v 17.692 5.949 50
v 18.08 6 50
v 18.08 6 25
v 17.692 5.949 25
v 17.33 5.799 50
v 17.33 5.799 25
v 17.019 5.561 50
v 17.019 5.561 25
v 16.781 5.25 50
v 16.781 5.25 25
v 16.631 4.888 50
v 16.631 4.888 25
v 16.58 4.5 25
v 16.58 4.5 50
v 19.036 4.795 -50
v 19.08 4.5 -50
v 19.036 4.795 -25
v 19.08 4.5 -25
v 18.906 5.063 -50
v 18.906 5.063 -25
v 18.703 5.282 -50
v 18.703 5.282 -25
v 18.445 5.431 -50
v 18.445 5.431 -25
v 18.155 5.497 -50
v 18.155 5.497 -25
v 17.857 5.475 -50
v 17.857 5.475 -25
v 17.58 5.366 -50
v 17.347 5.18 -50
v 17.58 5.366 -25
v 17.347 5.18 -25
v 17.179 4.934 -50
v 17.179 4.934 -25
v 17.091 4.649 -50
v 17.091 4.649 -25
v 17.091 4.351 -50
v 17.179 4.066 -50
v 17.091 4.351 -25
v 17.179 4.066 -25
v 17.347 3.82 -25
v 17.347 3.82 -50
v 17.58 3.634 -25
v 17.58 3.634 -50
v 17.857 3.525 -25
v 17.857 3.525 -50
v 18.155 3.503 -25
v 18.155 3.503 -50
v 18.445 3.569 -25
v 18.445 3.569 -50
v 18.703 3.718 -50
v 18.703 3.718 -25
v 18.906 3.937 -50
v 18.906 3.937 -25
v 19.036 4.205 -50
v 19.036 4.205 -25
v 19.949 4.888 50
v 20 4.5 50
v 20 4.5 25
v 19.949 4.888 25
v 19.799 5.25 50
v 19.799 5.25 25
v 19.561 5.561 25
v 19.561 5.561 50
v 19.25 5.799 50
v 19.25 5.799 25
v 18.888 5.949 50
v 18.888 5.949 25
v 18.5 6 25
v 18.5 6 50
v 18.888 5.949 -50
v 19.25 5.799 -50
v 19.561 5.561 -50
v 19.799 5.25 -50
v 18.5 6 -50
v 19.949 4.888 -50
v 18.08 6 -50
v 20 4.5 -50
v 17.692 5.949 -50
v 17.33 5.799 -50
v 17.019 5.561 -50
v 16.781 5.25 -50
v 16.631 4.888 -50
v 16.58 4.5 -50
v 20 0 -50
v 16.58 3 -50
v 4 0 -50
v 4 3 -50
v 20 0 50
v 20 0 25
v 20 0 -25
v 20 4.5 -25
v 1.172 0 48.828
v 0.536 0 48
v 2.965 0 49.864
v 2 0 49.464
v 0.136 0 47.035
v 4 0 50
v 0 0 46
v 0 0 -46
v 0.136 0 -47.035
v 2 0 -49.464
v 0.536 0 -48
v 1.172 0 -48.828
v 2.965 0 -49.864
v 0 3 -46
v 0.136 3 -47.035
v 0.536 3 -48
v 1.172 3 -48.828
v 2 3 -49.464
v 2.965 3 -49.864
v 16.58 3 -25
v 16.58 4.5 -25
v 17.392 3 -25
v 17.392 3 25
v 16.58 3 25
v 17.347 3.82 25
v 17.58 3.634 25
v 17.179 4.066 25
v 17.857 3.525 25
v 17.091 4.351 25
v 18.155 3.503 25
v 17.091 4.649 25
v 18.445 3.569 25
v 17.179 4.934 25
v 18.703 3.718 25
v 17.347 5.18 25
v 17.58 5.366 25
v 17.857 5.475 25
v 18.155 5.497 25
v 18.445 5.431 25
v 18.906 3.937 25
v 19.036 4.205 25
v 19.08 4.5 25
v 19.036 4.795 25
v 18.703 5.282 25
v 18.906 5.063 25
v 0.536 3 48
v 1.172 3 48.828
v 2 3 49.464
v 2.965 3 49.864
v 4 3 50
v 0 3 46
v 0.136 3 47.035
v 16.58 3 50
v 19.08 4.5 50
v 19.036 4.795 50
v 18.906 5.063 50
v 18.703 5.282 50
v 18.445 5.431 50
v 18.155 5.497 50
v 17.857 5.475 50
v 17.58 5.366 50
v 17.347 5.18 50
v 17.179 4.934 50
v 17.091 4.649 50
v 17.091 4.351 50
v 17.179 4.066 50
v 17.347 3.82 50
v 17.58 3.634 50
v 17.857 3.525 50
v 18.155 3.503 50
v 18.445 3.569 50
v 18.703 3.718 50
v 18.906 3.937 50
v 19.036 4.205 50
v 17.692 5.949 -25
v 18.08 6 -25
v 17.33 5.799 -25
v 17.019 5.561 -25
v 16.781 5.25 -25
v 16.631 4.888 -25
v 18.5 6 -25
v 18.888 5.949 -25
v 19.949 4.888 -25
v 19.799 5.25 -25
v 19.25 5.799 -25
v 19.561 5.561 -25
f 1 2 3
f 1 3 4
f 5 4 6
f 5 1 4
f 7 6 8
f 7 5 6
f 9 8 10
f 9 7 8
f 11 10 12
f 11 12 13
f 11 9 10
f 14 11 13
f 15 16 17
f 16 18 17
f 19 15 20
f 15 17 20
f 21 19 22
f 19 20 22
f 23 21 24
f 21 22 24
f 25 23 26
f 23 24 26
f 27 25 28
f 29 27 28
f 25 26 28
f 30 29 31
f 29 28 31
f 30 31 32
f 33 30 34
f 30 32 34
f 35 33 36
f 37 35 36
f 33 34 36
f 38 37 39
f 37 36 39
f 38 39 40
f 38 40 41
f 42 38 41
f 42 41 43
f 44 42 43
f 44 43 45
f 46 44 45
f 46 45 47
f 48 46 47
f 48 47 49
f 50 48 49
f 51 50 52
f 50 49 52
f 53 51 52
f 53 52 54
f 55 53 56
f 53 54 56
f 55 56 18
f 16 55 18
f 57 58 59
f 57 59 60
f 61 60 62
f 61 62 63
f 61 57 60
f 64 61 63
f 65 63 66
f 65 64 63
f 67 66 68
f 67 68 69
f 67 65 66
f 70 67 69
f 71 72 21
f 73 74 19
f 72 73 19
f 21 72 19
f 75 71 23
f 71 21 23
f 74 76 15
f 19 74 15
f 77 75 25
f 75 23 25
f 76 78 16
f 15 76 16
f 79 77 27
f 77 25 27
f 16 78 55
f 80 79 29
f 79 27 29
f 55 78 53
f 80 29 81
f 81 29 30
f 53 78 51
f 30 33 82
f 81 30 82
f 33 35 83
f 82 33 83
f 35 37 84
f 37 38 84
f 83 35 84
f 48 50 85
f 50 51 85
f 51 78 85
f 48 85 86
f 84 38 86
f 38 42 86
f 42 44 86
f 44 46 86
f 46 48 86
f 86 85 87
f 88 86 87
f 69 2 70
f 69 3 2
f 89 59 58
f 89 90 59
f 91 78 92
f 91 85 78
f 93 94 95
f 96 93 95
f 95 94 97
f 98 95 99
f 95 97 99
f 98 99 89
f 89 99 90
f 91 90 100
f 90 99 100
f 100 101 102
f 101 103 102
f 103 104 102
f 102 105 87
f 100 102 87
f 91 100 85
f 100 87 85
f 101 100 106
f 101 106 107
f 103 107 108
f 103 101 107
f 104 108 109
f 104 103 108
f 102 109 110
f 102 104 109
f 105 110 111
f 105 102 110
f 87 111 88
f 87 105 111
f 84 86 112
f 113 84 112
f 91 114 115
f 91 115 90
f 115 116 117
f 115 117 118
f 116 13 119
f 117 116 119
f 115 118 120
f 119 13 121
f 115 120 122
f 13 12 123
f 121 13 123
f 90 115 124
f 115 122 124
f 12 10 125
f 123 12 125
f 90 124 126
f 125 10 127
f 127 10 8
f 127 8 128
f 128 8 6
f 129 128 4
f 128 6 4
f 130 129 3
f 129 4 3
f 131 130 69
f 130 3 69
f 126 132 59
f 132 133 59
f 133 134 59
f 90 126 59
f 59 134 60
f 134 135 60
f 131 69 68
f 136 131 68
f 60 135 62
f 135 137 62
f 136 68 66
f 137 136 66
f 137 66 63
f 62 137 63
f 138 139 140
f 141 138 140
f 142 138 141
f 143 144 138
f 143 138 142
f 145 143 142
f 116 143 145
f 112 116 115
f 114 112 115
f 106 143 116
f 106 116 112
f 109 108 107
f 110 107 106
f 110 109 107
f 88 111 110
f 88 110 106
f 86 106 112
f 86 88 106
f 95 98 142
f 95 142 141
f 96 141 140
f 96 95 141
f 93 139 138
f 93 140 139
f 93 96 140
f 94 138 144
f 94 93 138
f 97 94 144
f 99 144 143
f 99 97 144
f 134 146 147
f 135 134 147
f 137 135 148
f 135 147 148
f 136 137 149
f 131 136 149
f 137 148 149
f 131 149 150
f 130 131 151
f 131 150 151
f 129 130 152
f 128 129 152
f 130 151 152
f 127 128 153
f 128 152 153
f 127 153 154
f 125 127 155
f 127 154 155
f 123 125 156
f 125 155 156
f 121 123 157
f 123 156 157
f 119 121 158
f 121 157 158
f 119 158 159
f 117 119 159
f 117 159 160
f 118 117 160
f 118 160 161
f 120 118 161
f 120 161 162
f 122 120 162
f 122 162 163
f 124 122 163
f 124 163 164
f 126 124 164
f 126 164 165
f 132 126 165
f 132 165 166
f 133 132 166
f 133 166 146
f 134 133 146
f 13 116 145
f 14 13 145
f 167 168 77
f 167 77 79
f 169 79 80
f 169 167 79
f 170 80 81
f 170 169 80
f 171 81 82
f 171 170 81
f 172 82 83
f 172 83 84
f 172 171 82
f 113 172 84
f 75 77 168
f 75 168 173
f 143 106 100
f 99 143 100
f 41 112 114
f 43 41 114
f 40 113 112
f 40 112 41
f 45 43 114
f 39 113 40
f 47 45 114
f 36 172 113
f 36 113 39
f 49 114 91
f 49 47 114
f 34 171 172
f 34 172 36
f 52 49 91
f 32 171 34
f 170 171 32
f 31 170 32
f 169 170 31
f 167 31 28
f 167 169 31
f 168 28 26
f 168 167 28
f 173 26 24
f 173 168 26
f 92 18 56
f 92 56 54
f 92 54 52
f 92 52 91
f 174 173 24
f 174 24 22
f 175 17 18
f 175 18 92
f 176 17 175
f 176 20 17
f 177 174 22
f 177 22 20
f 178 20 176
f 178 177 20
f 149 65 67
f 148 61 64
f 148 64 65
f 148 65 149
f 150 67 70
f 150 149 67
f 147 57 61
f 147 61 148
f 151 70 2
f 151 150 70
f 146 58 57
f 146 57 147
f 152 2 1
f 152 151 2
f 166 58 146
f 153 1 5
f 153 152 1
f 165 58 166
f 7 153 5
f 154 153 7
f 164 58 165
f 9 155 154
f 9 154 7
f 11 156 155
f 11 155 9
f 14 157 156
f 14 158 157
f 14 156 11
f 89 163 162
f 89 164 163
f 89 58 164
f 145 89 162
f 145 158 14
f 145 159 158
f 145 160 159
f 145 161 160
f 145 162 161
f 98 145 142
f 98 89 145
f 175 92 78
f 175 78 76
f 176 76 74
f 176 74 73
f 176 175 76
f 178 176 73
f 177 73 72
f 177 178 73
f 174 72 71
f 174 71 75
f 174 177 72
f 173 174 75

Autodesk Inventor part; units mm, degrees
ref_plane "YZ Plane" through (0, 0, 0) normal (1, 0, 0) x (0, 1, 0)
ref_plane "XZ Plane" through (0, 0, 0) normal (0, 1, 0) x (-1, 0, 0)
ref_plane "XY Plane" through (0, 0, 0) normal (0, 0, 1) x (1, 0, 0)
sketch "Эскиз2" plane through (0, 0, 0) normal (0, 0, 1) x (1, 0, 0)
  line L0 (0, 0) -> (20, 0)
  line L1 (20, 0) -> (20, 3)
  line L2 (20, 3) -> (0, 3)
  line L3 (0, 3) -> (0, 0)
  dimension "d14" = 20
  dimension "d15" = 3
extrude "Выдавливание2" add sketch "Эскиз2" along normal mid plane 100
fillet "Сопряжение1" radius 4 2 edges at (0, 1.5, 50) (0, 1.5, -50)
sketch "Эскиз5" plane through (20, 3, 50) normal (0, 1, 0) x (1, 0, 0)
  line L0 (0, 100) -> (0, 0) projected
  line L1 (0, 0) -> (-16, 0) projected
  line L2 (0, 100) -> (-3.42, 100)
  line L3 (-3.42, 100) -> (-3.42, 0)
  line L4 (-3.42, 0) -> (0, 0)
  line L5 (0, 0) -> (0, 100)
  point P0 (-20, 50)
  dimension "d25" = 3.42
extrude "Выдавливание4" add sketch "Эскиз5" along normal blind 3
sketch "Эскиз6" plane through (0, 0, 50) normal (0, 0, 1) x (1, 0, 0)
  circle A0 centre (18.08, 4.5) radius 1
  line L0 (16.58, 6) -> (20, 6) projected
  line L1 (16.58, 3) -> (16.58, 6) projected
  point P0 (0, 0)
  dimension "d28" = 2
  dimension "d29" = 1.5
  dimension "d30" = 1.5
extrude "Выдавливание5" cut sketch "Эскиз6" against normal through all
sketch "Эскиз7" plane through (20, 6, 50) normal (0, 1, 0) x (1, 0, 0)
  line L0 (-3.42, 100) -> (-3.42, 0) projected
  line L1 (0, 0) -> (0, 100) projected
  line L2 (-3.42, 25) -> (0, 25)
  line L3 (0, 25) -> (0, 75)
  line L4 (0, 75) -> (-3.42, 75)
  line L5 (-3.42, 75) -> (-3.42, 25)
  line L6 (-3.42, 0) -> (-16, 0) projected
  point P0 (-20, 50)
  point P1 (-3.42, 75)
  point P2 (0, 25)
  dimension "d33" = 50
  dimension "d34" = 25
extrude "Выдавливание6" cut sketch "Эскиз7" against normal blind 3
fillet "Сопряжение2" radius 1.5 4 edges at (20, 6, 37.5) (16.58, 6, 37.5) (20, 6, -37.5) (16.58, 6, -37.5)
sketch "Эскиз8" plane through (16.58, 3, -25) normal (0, 0, 1) x (1, 0, 0)
  line L0 (3.42, -3) -> (3.42, 1.5) projected
  line L1 (0, 0.9343) -> (3.42, -3)
  line L2 (3.42, -3) -> (-12.58, -3) projected
  line L3 (0, 0) -> (0, 1.5) projected
  line L4 (0, 0.9343) -> (3.42, 0.9343)
  point P0 (-16.58, -3)
  dimension "d38" = 49
extrude "Выдавливание7" cut sketch "Эскиз8" along normal up to surface (50 mm away)
properties part number "Cover"
